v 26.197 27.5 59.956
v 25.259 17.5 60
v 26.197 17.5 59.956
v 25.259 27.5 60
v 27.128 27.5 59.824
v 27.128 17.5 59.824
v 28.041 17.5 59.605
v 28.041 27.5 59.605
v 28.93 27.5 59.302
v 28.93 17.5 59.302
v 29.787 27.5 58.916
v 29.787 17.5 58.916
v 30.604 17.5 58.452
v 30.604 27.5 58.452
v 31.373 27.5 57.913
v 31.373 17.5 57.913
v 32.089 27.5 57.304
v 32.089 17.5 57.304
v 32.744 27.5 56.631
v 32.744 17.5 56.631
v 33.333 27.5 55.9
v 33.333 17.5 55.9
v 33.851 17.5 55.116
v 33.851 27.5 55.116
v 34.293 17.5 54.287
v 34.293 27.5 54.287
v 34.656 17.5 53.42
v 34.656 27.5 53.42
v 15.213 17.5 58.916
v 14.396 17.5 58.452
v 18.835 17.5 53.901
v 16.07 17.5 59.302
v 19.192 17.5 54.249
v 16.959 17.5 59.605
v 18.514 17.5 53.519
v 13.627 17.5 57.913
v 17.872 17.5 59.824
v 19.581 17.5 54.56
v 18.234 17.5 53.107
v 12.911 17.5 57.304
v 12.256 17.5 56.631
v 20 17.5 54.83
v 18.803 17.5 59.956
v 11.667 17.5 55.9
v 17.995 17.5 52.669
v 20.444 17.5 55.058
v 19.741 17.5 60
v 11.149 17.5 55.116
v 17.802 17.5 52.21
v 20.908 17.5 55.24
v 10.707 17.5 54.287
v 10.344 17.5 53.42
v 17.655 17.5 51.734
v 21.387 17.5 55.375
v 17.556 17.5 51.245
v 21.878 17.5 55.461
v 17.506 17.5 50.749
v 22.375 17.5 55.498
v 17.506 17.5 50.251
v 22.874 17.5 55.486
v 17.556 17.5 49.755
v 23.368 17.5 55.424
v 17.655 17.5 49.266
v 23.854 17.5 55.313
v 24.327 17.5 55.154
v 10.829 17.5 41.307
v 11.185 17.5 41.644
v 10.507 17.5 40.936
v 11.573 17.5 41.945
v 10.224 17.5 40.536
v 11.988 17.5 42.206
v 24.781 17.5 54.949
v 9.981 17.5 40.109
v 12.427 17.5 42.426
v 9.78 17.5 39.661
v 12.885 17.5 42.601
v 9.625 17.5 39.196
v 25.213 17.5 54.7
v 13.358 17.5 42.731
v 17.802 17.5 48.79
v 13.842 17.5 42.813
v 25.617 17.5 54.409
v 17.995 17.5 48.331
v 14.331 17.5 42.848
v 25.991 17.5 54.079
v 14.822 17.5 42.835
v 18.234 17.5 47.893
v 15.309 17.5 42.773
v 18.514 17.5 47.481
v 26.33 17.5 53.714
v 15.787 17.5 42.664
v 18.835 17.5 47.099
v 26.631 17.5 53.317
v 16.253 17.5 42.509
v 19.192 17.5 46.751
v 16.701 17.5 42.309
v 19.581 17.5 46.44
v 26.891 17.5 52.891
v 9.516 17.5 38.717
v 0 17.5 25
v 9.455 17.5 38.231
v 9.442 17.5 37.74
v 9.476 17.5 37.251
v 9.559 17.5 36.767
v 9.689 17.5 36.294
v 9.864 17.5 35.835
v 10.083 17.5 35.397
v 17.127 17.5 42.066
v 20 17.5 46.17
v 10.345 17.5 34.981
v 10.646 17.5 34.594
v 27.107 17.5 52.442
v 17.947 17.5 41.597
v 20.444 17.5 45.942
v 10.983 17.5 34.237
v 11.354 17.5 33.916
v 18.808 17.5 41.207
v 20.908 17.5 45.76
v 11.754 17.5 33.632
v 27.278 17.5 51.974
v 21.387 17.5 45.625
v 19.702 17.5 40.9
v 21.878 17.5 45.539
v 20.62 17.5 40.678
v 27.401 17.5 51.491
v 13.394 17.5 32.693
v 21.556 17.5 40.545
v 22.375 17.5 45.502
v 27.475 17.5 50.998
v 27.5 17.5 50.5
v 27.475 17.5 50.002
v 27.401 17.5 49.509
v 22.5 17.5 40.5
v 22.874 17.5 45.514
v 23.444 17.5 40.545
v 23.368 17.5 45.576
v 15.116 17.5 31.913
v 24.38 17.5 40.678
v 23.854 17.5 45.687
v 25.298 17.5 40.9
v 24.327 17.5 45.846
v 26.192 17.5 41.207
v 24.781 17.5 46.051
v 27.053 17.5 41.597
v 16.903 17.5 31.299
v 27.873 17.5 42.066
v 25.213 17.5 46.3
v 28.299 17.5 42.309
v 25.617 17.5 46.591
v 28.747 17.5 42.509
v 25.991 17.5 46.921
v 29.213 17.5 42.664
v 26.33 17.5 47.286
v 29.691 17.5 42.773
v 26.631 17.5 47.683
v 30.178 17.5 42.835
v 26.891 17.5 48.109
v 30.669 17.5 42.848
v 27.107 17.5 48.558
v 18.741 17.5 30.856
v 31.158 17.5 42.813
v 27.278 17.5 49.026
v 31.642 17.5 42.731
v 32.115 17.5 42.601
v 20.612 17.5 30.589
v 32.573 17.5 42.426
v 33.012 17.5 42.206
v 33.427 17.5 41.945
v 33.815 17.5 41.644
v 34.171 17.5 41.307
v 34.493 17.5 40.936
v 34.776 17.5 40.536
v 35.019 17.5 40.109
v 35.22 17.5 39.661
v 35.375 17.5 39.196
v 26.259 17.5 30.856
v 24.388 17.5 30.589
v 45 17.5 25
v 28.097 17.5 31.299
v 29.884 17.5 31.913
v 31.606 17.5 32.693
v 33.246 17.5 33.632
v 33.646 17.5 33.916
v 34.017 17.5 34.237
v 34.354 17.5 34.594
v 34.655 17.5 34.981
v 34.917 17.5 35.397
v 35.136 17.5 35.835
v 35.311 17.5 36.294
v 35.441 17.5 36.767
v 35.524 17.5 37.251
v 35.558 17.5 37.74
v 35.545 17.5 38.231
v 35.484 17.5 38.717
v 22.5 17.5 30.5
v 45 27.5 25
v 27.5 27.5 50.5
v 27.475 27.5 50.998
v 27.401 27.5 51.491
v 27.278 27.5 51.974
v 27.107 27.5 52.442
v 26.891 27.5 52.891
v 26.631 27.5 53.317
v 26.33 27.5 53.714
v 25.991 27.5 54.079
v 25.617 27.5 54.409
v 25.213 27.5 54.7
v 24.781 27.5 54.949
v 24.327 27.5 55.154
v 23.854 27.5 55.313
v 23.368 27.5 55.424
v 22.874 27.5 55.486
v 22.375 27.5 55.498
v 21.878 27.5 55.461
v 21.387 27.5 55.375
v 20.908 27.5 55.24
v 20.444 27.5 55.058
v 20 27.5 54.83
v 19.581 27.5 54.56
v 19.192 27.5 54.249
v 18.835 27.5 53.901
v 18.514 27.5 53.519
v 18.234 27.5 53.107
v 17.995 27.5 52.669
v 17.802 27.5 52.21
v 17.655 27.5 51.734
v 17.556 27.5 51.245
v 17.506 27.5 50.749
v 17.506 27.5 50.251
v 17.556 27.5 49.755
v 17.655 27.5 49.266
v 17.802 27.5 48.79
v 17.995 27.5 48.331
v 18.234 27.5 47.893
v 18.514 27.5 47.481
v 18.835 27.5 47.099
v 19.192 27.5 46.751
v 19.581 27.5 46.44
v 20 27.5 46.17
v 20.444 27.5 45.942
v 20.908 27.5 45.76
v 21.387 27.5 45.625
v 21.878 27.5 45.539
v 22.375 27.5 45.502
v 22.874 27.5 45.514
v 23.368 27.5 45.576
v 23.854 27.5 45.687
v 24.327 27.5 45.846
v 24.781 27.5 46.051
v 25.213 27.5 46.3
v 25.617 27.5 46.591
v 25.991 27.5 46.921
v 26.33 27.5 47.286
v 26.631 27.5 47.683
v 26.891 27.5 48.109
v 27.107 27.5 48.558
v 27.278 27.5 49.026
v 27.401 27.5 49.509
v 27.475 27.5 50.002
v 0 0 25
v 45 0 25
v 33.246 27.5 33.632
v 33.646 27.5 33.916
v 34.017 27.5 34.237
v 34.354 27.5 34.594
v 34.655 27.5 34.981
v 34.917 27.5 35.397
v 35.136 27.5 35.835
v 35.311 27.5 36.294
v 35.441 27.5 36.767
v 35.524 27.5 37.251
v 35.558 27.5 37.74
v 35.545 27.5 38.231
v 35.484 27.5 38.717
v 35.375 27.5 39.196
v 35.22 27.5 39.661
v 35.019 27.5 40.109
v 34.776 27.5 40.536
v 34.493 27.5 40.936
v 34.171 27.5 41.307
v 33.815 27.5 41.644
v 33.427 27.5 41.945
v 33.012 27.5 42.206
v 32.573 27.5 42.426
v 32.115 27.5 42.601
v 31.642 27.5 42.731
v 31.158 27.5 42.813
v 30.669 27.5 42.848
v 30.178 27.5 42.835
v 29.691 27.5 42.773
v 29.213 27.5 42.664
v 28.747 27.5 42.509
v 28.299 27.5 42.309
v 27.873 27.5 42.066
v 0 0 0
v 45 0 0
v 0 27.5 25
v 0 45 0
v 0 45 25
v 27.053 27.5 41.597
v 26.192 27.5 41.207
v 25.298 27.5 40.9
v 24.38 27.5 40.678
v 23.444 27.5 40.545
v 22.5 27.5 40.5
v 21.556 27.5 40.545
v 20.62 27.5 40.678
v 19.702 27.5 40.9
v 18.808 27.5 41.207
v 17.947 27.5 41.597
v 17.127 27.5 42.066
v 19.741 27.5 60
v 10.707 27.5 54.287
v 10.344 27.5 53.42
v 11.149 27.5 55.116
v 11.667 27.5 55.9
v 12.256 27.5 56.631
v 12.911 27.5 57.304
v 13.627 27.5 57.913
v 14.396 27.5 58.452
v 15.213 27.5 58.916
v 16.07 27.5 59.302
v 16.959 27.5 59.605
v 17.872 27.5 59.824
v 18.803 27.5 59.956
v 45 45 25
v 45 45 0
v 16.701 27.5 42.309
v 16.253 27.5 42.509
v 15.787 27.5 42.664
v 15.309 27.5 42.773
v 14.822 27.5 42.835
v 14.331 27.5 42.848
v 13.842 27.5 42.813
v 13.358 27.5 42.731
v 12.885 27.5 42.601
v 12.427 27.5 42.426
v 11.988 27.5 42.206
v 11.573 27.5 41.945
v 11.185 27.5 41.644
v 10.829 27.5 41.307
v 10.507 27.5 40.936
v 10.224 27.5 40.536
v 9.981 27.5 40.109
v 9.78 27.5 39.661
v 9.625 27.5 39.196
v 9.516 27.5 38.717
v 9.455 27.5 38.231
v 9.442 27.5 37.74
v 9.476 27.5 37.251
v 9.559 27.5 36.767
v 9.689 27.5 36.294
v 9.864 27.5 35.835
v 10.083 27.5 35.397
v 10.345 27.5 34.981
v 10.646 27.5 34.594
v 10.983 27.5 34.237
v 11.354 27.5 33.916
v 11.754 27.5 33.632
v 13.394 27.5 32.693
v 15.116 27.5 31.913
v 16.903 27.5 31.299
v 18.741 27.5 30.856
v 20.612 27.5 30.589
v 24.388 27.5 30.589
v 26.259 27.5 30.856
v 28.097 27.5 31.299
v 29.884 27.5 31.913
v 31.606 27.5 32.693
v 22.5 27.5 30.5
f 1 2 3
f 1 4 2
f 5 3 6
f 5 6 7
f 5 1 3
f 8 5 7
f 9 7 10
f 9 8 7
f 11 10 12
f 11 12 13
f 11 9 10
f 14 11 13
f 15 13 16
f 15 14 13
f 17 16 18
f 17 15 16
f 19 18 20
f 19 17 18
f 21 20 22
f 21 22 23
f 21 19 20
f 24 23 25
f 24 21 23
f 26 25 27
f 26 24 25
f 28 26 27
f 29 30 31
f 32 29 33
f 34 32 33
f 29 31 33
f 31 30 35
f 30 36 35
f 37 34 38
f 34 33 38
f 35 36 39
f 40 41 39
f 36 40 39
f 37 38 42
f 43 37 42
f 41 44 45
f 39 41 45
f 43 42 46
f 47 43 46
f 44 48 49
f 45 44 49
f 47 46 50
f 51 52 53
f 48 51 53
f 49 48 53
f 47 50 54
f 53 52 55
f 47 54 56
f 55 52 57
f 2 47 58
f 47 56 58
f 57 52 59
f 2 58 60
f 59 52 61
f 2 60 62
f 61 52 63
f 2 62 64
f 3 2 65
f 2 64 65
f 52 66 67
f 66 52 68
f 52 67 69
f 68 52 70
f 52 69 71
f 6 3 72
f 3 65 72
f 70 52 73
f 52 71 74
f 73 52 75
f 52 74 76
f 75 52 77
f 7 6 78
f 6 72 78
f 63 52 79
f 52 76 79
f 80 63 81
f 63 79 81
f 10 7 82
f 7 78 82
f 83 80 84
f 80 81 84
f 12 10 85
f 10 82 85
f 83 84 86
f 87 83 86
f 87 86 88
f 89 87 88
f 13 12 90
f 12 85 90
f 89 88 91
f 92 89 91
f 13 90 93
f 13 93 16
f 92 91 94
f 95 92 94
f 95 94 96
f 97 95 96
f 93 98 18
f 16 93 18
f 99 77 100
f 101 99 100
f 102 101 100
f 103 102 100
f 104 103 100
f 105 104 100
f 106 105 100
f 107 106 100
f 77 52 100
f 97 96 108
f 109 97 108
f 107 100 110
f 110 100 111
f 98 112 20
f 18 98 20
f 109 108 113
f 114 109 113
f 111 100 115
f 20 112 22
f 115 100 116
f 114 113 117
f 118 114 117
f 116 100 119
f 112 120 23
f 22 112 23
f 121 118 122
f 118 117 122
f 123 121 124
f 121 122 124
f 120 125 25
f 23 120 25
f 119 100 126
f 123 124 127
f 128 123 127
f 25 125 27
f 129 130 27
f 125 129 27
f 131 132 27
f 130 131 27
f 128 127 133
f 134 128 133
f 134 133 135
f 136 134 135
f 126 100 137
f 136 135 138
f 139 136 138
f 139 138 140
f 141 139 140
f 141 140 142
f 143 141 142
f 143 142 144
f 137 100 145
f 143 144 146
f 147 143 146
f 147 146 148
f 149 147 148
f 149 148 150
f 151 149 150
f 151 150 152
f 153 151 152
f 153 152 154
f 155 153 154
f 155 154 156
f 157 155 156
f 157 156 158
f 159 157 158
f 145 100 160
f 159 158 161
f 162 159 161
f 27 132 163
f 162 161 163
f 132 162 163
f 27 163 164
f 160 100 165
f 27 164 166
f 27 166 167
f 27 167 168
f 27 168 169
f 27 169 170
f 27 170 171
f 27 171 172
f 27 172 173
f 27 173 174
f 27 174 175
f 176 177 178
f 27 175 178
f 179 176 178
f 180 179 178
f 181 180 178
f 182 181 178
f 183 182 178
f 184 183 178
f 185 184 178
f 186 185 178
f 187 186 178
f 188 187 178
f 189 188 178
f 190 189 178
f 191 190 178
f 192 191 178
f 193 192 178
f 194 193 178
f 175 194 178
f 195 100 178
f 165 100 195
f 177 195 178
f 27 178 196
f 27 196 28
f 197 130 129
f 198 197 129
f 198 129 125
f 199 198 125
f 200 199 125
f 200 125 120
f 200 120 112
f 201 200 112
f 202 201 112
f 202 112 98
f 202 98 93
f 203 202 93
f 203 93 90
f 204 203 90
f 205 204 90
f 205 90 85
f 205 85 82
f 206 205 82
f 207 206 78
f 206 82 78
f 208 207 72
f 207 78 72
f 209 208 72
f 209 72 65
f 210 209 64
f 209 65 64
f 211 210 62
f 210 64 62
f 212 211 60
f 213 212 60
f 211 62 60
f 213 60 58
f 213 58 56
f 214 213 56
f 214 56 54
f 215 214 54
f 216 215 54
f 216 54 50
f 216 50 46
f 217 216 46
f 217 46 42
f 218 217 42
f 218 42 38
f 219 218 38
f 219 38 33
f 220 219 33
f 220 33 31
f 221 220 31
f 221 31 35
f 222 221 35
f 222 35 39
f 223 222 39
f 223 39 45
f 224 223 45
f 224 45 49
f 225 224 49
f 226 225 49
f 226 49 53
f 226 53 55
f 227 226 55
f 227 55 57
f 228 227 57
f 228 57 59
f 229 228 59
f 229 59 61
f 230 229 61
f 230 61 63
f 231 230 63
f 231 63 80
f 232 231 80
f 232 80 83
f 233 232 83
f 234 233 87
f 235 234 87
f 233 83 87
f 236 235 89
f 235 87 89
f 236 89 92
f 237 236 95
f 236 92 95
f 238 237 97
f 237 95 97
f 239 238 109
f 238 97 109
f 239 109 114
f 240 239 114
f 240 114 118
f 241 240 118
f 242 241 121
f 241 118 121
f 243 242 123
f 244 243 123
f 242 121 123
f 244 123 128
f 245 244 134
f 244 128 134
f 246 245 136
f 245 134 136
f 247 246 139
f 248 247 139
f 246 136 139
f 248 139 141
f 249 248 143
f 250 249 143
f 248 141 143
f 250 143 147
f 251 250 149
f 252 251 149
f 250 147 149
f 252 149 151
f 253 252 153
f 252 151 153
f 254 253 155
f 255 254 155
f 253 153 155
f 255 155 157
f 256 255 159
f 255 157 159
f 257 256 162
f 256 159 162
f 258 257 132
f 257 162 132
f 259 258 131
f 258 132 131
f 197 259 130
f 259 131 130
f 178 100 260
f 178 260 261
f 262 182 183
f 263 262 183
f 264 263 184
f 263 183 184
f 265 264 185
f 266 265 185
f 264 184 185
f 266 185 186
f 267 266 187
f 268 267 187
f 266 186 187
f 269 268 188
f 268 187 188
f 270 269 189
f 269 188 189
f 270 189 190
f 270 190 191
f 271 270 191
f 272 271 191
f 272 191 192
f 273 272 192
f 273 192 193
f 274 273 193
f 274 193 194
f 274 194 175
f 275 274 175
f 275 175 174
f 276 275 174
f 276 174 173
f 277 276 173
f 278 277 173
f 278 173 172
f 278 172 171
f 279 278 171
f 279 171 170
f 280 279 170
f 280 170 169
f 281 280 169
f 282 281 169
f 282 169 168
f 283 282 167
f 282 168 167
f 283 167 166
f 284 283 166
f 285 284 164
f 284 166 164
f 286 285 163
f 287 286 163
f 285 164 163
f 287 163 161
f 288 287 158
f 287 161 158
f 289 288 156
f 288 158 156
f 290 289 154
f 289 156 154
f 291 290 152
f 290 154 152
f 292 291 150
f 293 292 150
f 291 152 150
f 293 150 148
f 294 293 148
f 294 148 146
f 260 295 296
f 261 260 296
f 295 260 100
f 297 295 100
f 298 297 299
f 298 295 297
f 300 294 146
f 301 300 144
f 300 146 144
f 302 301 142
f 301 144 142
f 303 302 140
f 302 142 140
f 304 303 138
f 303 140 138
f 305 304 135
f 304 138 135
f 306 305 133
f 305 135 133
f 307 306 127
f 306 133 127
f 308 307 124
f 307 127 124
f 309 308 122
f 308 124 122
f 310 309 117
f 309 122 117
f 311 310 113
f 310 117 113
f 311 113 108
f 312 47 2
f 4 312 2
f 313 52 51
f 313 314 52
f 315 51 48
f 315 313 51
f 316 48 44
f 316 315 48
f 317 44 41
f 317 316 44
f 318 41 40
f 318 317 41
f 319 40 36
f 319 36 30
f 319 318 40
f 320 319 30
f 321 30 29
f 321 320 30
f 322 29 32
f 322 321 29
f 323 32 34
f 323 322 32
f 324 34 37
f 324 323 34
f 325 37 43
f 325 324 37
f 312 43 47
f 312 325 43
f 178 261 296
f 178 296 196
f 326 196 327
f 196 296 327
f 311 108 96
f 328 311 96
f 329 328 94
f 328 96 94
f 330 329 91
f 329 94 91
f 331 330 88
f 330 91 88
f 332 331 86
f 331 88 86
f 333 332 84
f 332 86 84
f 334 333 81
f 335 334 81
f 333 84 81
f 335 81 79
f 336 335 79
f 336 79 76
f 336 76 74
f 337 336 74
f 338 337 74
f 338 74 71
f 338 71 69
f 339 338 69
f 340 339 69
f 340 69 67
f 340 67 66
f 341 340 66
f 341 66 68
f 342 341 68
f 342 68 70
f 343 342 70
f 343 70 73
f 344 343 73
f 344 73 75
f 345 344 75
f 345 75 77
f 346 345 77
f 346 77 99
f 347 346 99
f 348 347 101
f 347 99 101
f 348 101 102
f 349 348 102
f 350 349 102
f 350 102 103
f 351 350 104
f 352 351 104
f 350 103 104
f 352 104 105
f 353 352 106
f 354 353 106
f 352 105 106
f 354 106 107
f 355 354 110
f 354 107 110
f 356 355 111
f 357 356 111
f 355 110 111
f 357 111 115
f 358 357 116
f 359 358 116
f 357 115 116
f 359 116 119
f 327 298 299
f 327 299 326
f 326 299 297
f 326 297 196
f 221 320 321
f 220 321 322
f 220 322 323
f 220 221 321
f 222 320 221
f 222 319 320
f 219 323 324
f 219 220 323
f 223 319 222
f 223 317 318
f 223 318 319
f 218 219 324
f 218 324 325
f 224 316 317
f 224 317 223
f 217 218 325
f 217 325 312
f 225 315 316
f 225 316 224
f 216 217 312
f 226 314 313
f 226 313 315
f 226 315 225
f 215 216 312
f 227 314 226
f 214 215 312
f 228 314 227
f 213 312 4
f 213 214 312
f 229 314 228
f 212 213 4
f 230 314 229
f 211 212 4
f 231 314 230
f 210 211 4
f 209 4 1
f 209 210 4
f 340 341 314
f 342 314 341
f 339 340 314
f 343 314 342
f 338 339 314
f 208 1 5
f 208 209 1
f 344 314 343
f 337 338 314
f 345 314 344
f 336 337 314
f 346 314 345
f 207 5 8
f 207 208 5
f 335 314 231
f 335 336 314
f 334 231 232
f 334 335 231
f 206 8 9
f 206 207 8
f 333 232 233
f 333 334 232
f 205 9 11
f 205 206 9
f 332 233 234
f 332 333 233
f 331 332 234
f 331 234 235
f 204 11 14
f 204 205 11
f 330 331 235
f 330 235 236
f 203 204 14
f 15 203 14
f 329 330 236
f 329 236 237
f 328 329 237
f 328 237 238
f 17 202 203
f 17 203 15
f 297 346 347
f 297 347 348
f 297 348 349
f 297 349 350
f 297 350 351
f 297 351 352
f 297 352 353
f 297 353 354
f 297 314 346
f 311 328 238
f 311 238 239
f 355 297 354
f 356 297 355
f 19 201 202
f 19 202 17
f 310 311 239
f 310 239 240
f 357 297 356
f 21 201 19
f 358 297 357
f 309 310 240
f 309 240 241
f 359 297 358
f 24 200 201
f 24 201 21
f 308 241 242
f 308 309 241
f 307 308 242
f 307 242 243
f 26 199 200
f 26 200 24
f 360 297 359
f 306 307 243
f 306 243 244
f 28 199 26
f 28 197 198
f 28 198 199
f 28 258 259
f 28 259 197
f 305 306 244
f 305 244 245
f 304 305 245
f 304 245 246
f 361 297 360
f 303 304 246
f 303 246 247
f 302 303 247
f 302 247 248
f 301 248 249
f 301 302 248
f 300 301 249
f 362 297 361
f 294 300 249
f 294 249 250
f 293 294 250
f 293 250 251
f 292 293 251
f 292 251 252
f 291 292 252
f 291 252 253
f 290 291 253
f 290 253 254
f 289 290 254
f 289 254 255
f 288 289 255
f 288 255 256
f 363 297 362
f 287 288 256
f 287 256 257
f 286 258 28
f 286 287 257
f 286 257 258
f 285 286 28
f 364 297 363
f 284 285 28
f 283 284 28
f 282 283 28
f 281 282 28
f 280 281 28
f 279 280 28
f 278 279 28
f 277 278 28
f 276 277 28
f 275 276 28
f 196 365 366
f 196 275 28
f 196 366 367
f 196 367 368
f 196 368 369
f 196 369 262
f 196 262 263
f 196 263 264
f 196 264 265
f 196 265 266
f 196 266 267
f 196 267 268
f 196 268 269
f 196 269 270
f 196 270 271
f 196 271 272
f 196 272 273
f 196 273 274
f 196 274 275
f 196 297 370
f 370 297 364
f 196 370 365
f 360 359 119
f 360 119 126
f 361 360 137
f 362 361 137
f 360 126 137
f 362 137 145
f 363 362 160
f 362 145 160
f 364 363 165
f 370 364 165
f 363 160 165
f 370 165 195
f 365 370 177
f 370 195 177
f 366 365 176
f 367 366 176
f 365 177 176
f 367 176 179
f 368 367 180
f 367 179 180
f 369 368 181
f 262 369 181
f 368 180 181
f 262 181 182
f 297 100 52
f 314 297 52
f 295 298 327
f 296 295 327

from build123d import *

# Parameters (mm, degrees)
SKETCH1_W           = 45
SKETCH1_H           = 45
BOSS_EXTRUDE1_DEPTH = 25
SKETCH3_W           = 45
SKETCH3_H           = 10
BOSS_EXTRUDE2_DEPTH = 35
SKETCH4_R           = 5
CUT_EXTRUDE4_DEPTH  = 28.5
CUT_EXTRUDE5_DEPTH  = 46
FILLET1_R           = 10


with BuildPart() as part:
    # Sketch1 → Boss-Extrude1 (new body)
    with BuildSketch(Plane.XY):
        with Locations((22.5, 22.5)):
            Rectangle(SKETCH1_W, SKETCH1_H)
    extrude(amount=BOSS_EXTRUDE1_DEPTH)

    # Sketch3 → Boss-Extrude2 (add)
    with BuildSketch(Plane.XY.offset(25)):
        with Locations((22.5, 22.5)):
            Rectangle(SKETCH3_W, SKETCH3_H)
    extrude(amount=BOSS_EXTRUDE2_DEPTH)

    # Sketch4 → Cut-Extrude4 (cut, through all)
    with BuildSketch(Plane.XZ.offset(-17.5)):
        with Locations((22.5, 50.5)):
            Circle(SKETCH4_R)
        with BuildLine():
            ThreePointArc((33.245992167, 33.632171084), (34.776451354, 40.535626355), (27.872996083, 42.066085542))
            ThreePointArc((27.872996083, 42.066085542), (22.5, 40.5), (17.127003917, 42.066085542))
            ThreePointArc((17.127003917, 42.066085542), (10.223548646, 40.535626355), (11.754007833, 33.632171084))
            ThreePointArc((11.754007833, 33.632171084), (22.5, 30.5), (33.245992167, 33.632171084))
        make_face()
    extrude(amount=-CUT_EXTRUDE4_DEPTH, mode=Mode.SUBTRACT)

    # Sketch5 → Cut-Extrude5 (cut, through all)
    with BuildSketch(Plane(origin=(0, 0, 0), x_dir=(1, 0, 0), z_dir=(0, 1, 0))):
        Polygon((45, -25), (32.261041801, -60), (45, -60), align=None)
        Polygon((0, -25), (12.738958199, -60), (0, -60), align=None)
    extrude(amount=CUT_EXTRUDE5_DEPTH, mode=Mode.SUBTRACT)

    # Fillet1
    fillet1_edges = [part.edges().sort_by_distance(p)[0] for p in [
        (12.738958199, 22.5, 60),
        (32.261041801, 22.5, 60),
    ]]
    fillet(fillet1_edges, radius=FILLET1_R)


solid = part.part
